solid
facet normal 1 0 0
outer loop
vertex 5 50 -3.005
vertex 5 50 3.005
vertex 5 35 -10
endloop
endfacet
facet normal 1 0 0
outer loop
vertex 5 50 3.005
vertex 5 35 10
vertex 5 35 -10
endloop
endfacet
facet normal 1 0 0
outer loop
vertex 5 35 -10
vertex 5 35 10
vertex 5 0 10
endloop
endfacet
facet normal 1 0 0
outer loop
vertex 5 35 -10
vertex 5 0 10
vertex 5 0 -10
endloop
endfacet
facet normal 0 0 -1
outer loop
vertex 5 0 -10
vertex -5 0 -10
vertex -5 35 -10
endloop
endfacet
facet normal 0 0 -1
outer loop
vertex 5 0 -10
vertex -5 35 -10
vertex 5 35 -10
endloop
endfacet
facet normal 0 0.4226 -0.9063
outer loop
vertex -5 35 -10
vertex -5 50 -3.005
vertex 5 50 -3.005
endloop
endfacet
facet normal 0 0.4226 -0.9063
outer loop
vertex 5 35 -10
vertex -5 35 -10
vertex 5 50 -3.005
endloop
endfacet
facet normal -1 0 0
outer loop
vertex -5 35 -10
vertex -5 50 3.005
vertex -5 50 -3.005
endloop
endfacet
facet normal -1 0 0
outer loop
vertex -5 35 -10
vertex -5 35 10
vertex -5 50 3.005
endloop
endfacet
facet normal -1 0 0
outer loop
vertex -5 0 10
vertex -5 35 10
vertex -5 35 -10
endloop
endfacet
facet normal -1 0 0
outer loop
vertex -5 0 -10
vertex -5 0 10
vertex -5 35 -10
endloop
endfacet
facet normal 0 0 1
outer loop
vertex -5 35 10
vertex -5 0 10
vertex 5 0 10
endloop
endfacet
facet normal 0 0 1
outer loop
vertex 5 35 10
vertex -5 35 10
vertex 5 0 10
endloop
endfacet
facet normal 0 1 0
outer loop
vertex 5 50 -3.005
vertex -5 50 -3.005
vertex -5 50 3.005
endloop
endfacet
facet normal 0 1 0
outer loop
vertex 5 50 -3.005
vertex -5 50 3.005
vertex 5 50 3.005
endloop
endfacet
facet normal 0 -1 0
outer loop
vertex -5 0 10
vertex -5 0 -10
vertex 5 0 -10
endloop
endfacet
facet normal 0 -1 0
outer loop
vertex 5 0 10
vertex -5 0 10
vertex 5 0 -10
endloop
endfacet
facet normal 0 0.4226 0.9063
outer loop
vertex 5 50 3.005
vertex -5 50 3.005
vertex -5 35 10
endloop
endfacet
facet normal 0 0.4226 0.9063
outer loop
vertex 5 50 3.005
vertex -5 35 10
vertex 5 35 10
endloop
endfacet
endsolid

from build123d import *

# Parameters (mm, degrees)
SKETCH_1_W      = 10
SKETCH_1_H      = 20
EXTRUDE_1_DEPTH = 50
CHAMFER_1_SIZE  = 15
CHAMFER_1_SIZE2 = 6.994614872
CHAMFER_2_SIZE  = 15
CHAMFER_2_SIZE2 = 6.994614872


with BuildPart() as part:
    # Эскиз1 → Вытянуть1 (new body)
    with BuildSketch(Plane(origin=(0, 0, 0), x_dir=(1, 0, 0), z_dir=(0, 1, 0))):
        Rectangle(SKETCH_1_W, SKETCH_1_H)
    extrude(amount=EXTRUDE_1_DEPTH)

    # Фаска1
    chamfer_1_edges = [part.edges().sort_by_distance(p)[0] for p in [
        (0, 50, 10),
    ]]
    chamfer_1_side = [part.faces().sort_by_distance(p)[0] for p in [
        (0, 25, 10),
    ]]
    chamfer(chamfer_1_edges, length=CHAMFER_1_SIZE, length2=CHAMFER_1_SIZE2, reference=chamfer_1_side[0])

    # Фаска2
    chamfer_2_edges = [part.edges().sort_by_distance(p)[0] for p in [
        (0, 50, -10),
    ]]
    chamfer_2_side = [part.faces().sort_by_distance(p)[0] for p in [
        (0, 25, -10),
    ]]
    chamfer(chamfer_2_edges, length=CHAMFER_2_SIZE, length2=CHAMFER_2_SIZE2, reference=chamfer_2_side[0])


solid = part.part
